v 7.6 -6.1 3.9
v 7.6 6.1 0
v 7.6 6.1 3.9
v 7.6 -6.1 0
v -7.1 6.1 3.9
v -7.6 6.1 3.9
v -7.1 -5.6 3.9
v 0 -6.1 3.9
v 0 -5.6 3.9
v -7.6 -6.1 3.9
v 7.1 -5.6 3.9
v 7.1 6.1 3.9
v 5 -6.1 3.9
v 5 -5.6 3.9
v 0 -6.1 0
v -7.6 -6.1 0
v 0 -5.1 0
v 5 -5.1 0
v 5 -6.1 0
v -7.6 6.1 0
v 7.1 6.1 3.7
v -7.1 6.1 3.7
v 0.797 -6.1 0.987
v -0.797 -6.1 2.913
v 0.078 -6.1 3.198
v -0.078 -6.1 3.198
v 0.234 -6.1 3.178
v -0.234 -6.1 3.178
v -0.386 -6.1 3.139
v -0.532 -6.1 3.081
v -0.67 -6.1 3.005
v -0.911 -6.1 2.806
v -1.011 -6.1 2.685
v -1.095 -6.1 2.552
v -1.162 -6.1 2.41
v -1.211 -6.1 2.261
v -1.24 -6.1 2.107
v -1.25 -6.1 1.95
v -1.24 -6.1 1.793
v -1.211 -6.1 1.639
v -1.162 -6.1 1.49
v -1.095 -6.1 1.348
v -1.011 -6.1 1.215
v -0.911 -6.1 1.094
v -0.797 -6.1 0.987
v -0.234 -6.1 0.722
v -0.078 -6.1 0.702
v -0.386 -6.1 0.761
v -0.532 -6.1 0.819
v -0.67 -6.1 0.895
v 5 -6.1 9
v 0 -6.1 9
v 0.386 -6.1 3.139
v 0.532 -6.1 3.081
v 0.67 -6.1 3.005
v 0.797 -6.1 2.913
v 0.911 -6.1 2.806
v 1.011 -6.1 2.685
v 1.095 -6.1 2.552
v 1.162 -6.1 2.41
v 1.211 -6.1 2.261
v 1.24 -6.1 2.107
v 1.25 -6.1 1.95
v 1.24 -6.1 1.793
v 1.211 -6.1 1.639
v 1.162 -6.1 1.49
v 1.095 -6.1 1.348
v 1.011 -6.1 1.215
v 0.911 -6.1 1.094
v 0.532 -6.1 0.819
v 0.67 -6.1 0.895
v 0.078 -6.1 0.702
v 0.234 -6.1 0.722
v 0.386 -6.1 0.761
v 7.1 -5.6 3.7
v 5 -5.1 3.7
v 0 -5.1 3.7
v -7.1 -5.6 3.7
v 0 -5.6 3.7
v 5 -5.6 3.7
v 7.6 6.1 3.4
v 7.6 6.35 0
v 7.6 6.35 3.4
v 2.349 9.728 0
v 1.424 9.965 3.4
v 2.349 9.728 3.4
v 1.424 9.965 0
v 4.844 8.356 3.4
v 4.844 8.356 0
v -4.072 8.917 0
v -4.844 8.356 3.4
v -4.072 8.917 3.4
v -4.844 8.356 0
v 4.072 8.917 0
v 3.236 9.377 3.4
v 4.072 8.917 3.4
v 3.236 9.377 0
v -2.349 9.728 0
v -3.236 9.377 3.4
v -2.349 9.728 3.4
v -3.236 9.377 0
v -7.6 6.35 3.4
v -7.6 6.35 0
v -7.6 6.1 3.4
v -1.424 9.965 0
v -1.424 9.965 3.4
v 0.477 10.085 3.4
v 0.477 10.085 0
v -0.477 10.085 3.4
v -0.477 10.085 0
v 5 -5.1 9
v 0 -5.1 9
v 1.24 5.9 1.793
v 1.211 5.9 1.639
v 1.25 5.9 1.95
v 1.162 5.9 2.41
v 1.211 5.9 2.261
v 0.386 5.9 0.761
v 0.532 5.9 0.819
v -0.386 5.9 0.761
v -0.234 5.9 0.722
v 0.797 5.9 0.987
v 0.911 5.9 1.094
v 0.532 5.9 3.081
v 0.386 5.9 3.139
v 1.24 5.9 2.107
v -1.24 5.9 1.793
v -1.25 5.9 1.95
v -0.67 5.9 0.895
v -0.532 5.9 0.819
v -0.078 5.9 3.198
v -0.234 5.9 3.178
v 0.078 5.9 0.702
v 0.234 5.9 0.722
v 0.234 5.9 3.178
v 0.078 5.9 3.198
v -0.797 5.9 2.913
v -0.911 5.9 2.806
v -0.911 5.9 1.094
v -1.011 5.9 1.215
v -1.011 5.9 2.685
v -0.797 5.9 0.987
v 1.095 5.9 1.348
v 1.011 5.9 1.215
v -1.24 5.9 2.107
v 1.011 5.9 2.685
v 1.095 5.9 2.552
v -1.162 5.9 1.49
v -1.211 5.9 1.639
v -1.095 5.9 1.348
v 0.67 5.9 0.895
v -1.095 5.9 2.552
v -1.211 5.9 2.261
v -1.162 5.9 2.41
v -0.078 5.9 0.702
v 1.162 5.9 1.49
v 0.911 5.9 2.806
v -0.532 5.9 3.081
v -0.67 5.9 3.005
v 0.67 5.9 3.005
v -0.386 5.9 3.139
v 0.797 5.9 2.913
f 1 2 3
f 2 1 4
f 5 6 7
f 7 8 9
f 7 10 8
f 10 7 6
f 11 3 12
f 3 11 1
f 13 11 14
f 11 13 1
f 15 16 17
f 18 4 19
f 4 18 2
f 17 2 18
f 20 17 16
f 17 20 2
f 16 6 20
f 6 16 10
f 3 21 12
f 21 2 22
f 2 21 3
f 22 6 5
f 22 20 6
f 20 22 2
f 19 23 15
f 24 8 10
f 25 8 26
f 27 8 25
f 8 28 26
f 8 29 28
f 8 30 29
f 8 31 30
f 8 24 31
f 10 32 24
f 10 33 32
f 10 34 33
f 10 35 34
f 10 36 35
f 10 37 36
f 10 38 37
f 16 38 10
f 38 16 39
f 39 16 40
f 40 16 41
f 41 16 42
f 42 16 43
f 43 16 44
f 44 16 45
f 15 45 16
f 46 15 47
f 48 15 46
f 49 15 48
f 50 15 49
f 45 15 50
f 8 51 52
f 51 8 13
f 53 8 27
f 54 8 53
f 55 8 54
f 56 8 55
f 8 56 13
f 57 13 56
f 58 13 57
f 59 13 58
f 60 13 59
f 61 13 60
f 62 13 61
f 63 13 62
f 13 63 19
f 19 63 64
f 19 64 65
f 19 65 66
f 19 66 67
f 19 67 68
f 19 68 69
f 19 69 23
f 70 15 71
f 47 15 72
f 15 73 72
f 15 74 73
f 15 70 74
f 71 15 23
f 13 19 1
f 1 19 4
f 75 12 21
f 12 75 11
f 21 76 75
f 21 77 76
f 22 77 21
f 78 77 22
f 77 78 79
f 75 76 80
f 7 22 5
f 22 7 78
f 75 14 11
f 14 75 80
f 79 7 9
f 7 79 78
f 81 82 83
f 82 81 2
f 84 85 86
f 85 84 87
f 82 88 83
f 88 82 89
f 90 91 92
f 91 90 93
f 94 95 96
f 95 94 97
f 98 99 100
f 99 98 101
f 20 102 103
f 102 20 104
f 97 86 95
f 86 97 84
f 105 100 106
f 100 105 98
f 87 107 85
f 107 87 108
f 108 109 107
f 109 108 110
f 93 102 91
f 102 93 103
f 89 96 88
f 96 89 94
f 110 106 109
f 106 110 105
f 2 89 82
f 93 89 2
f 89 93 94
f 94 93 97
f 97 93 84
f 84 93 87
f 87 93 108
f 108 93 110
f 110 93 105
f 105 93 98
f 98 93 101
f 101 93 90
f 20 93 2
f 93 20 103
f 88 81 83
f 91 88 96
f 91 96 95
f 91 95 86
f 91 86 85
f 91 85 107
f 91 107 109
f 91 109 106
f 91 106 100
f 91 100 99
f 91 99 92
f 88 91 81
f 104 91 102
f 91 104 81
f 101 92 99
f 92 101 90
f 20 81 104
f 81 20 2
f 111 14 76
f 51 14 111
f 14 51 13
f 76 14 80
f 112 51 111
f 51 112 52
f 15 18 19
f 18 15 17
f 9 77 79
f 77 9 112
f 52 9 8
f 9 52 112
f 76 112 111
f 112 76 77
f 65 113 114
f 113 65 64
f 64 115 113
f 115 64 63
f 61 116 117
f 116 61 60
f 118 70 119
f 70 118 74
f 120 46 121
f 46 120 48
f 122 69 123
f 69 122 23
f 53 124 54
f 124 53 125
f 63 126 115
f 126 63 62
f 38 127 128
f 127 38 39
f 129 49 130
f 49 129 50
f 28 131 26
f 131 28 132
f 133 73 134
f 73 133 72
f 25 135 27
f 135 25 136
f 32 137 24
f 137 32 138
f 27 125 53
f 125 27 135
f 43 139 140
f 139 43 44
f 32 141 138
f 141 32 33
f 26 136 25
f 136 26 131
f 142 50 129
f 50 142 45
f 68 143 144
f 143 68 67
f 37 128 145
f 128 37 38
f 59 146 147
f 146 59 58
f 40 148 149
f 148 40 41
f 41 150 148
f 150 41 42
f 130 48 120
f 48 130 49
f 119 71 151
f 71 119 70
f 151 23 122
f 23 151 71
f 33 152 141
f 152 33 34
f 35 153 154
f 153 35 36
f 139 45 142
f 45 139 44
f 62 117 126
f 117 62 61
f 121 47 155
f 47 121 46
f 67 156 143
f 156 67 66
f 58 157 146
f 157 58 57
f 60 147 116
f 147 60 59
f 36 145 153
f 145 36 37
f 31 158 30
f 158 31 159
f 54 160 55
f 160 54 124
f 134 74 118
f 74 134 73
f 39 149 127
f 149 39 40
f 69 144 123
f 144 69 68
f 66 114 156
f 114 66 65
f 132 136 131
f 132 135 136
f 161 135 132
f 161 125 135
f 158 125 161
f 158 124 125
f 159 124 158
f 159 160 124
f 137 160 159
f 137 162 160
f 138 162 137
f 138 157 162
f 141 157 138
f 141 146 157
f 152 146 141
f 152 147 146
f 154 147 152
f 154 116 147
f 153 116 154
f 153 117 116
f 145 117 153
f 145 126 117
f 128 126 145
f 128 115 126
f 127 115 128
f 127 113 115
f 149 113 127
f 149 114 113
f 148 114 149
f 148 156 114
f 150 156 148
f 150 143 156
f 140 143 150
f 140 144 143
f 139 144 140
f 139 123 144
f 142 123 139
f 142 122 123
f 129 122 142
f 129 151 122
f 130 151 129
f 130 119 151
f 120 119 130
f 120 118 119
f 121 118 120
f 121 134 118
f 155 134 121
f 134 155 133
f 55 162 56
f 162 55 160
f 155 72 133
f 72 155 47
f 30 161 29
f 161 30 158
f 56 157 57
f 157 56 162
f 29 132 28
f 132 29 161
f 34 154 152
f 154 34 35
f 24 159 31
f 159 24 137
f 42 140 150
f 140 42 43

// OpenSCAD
$fn = 50;

si=[15.2,12.2,3.9];
ln=15.56;
bort=0.2;
spil=0.5;
prz=12.1;
prd=2.5;
zub=[5,1,9];

difference(){
    blk();
    translate([0,-(si.y/2+0.1),si.z/2])rotate([-90,0,0])cylinder(prz, prd/2, prd/2);
}
module blk(){
    translate([0,0,si.z/2])difference(){
        cube(si,true);
        translate([0,0.5,si.z-0.2])cube([si.x-1,si.y,si.z],true);
    }
    nos();
    translate([zub.x/2,-si.y/2+zub.y/2,zub.z/2])cube(zub,true);
}

module nos(){
    translate([0,si.y/2,0])difference(){
        hull(){
            translate([0,0,(si.z-0.5)/2])cube([si.x,0.5,si.z-0.5],true);
            translate([0,-si.x/2+4,0])cylinder(si.z-0.5, si.x/2, si.x/2);
        }
        translate([0,-2*si.x,0])cube([4*si.x,4*si.x,4*si.x],true);
    }
}
